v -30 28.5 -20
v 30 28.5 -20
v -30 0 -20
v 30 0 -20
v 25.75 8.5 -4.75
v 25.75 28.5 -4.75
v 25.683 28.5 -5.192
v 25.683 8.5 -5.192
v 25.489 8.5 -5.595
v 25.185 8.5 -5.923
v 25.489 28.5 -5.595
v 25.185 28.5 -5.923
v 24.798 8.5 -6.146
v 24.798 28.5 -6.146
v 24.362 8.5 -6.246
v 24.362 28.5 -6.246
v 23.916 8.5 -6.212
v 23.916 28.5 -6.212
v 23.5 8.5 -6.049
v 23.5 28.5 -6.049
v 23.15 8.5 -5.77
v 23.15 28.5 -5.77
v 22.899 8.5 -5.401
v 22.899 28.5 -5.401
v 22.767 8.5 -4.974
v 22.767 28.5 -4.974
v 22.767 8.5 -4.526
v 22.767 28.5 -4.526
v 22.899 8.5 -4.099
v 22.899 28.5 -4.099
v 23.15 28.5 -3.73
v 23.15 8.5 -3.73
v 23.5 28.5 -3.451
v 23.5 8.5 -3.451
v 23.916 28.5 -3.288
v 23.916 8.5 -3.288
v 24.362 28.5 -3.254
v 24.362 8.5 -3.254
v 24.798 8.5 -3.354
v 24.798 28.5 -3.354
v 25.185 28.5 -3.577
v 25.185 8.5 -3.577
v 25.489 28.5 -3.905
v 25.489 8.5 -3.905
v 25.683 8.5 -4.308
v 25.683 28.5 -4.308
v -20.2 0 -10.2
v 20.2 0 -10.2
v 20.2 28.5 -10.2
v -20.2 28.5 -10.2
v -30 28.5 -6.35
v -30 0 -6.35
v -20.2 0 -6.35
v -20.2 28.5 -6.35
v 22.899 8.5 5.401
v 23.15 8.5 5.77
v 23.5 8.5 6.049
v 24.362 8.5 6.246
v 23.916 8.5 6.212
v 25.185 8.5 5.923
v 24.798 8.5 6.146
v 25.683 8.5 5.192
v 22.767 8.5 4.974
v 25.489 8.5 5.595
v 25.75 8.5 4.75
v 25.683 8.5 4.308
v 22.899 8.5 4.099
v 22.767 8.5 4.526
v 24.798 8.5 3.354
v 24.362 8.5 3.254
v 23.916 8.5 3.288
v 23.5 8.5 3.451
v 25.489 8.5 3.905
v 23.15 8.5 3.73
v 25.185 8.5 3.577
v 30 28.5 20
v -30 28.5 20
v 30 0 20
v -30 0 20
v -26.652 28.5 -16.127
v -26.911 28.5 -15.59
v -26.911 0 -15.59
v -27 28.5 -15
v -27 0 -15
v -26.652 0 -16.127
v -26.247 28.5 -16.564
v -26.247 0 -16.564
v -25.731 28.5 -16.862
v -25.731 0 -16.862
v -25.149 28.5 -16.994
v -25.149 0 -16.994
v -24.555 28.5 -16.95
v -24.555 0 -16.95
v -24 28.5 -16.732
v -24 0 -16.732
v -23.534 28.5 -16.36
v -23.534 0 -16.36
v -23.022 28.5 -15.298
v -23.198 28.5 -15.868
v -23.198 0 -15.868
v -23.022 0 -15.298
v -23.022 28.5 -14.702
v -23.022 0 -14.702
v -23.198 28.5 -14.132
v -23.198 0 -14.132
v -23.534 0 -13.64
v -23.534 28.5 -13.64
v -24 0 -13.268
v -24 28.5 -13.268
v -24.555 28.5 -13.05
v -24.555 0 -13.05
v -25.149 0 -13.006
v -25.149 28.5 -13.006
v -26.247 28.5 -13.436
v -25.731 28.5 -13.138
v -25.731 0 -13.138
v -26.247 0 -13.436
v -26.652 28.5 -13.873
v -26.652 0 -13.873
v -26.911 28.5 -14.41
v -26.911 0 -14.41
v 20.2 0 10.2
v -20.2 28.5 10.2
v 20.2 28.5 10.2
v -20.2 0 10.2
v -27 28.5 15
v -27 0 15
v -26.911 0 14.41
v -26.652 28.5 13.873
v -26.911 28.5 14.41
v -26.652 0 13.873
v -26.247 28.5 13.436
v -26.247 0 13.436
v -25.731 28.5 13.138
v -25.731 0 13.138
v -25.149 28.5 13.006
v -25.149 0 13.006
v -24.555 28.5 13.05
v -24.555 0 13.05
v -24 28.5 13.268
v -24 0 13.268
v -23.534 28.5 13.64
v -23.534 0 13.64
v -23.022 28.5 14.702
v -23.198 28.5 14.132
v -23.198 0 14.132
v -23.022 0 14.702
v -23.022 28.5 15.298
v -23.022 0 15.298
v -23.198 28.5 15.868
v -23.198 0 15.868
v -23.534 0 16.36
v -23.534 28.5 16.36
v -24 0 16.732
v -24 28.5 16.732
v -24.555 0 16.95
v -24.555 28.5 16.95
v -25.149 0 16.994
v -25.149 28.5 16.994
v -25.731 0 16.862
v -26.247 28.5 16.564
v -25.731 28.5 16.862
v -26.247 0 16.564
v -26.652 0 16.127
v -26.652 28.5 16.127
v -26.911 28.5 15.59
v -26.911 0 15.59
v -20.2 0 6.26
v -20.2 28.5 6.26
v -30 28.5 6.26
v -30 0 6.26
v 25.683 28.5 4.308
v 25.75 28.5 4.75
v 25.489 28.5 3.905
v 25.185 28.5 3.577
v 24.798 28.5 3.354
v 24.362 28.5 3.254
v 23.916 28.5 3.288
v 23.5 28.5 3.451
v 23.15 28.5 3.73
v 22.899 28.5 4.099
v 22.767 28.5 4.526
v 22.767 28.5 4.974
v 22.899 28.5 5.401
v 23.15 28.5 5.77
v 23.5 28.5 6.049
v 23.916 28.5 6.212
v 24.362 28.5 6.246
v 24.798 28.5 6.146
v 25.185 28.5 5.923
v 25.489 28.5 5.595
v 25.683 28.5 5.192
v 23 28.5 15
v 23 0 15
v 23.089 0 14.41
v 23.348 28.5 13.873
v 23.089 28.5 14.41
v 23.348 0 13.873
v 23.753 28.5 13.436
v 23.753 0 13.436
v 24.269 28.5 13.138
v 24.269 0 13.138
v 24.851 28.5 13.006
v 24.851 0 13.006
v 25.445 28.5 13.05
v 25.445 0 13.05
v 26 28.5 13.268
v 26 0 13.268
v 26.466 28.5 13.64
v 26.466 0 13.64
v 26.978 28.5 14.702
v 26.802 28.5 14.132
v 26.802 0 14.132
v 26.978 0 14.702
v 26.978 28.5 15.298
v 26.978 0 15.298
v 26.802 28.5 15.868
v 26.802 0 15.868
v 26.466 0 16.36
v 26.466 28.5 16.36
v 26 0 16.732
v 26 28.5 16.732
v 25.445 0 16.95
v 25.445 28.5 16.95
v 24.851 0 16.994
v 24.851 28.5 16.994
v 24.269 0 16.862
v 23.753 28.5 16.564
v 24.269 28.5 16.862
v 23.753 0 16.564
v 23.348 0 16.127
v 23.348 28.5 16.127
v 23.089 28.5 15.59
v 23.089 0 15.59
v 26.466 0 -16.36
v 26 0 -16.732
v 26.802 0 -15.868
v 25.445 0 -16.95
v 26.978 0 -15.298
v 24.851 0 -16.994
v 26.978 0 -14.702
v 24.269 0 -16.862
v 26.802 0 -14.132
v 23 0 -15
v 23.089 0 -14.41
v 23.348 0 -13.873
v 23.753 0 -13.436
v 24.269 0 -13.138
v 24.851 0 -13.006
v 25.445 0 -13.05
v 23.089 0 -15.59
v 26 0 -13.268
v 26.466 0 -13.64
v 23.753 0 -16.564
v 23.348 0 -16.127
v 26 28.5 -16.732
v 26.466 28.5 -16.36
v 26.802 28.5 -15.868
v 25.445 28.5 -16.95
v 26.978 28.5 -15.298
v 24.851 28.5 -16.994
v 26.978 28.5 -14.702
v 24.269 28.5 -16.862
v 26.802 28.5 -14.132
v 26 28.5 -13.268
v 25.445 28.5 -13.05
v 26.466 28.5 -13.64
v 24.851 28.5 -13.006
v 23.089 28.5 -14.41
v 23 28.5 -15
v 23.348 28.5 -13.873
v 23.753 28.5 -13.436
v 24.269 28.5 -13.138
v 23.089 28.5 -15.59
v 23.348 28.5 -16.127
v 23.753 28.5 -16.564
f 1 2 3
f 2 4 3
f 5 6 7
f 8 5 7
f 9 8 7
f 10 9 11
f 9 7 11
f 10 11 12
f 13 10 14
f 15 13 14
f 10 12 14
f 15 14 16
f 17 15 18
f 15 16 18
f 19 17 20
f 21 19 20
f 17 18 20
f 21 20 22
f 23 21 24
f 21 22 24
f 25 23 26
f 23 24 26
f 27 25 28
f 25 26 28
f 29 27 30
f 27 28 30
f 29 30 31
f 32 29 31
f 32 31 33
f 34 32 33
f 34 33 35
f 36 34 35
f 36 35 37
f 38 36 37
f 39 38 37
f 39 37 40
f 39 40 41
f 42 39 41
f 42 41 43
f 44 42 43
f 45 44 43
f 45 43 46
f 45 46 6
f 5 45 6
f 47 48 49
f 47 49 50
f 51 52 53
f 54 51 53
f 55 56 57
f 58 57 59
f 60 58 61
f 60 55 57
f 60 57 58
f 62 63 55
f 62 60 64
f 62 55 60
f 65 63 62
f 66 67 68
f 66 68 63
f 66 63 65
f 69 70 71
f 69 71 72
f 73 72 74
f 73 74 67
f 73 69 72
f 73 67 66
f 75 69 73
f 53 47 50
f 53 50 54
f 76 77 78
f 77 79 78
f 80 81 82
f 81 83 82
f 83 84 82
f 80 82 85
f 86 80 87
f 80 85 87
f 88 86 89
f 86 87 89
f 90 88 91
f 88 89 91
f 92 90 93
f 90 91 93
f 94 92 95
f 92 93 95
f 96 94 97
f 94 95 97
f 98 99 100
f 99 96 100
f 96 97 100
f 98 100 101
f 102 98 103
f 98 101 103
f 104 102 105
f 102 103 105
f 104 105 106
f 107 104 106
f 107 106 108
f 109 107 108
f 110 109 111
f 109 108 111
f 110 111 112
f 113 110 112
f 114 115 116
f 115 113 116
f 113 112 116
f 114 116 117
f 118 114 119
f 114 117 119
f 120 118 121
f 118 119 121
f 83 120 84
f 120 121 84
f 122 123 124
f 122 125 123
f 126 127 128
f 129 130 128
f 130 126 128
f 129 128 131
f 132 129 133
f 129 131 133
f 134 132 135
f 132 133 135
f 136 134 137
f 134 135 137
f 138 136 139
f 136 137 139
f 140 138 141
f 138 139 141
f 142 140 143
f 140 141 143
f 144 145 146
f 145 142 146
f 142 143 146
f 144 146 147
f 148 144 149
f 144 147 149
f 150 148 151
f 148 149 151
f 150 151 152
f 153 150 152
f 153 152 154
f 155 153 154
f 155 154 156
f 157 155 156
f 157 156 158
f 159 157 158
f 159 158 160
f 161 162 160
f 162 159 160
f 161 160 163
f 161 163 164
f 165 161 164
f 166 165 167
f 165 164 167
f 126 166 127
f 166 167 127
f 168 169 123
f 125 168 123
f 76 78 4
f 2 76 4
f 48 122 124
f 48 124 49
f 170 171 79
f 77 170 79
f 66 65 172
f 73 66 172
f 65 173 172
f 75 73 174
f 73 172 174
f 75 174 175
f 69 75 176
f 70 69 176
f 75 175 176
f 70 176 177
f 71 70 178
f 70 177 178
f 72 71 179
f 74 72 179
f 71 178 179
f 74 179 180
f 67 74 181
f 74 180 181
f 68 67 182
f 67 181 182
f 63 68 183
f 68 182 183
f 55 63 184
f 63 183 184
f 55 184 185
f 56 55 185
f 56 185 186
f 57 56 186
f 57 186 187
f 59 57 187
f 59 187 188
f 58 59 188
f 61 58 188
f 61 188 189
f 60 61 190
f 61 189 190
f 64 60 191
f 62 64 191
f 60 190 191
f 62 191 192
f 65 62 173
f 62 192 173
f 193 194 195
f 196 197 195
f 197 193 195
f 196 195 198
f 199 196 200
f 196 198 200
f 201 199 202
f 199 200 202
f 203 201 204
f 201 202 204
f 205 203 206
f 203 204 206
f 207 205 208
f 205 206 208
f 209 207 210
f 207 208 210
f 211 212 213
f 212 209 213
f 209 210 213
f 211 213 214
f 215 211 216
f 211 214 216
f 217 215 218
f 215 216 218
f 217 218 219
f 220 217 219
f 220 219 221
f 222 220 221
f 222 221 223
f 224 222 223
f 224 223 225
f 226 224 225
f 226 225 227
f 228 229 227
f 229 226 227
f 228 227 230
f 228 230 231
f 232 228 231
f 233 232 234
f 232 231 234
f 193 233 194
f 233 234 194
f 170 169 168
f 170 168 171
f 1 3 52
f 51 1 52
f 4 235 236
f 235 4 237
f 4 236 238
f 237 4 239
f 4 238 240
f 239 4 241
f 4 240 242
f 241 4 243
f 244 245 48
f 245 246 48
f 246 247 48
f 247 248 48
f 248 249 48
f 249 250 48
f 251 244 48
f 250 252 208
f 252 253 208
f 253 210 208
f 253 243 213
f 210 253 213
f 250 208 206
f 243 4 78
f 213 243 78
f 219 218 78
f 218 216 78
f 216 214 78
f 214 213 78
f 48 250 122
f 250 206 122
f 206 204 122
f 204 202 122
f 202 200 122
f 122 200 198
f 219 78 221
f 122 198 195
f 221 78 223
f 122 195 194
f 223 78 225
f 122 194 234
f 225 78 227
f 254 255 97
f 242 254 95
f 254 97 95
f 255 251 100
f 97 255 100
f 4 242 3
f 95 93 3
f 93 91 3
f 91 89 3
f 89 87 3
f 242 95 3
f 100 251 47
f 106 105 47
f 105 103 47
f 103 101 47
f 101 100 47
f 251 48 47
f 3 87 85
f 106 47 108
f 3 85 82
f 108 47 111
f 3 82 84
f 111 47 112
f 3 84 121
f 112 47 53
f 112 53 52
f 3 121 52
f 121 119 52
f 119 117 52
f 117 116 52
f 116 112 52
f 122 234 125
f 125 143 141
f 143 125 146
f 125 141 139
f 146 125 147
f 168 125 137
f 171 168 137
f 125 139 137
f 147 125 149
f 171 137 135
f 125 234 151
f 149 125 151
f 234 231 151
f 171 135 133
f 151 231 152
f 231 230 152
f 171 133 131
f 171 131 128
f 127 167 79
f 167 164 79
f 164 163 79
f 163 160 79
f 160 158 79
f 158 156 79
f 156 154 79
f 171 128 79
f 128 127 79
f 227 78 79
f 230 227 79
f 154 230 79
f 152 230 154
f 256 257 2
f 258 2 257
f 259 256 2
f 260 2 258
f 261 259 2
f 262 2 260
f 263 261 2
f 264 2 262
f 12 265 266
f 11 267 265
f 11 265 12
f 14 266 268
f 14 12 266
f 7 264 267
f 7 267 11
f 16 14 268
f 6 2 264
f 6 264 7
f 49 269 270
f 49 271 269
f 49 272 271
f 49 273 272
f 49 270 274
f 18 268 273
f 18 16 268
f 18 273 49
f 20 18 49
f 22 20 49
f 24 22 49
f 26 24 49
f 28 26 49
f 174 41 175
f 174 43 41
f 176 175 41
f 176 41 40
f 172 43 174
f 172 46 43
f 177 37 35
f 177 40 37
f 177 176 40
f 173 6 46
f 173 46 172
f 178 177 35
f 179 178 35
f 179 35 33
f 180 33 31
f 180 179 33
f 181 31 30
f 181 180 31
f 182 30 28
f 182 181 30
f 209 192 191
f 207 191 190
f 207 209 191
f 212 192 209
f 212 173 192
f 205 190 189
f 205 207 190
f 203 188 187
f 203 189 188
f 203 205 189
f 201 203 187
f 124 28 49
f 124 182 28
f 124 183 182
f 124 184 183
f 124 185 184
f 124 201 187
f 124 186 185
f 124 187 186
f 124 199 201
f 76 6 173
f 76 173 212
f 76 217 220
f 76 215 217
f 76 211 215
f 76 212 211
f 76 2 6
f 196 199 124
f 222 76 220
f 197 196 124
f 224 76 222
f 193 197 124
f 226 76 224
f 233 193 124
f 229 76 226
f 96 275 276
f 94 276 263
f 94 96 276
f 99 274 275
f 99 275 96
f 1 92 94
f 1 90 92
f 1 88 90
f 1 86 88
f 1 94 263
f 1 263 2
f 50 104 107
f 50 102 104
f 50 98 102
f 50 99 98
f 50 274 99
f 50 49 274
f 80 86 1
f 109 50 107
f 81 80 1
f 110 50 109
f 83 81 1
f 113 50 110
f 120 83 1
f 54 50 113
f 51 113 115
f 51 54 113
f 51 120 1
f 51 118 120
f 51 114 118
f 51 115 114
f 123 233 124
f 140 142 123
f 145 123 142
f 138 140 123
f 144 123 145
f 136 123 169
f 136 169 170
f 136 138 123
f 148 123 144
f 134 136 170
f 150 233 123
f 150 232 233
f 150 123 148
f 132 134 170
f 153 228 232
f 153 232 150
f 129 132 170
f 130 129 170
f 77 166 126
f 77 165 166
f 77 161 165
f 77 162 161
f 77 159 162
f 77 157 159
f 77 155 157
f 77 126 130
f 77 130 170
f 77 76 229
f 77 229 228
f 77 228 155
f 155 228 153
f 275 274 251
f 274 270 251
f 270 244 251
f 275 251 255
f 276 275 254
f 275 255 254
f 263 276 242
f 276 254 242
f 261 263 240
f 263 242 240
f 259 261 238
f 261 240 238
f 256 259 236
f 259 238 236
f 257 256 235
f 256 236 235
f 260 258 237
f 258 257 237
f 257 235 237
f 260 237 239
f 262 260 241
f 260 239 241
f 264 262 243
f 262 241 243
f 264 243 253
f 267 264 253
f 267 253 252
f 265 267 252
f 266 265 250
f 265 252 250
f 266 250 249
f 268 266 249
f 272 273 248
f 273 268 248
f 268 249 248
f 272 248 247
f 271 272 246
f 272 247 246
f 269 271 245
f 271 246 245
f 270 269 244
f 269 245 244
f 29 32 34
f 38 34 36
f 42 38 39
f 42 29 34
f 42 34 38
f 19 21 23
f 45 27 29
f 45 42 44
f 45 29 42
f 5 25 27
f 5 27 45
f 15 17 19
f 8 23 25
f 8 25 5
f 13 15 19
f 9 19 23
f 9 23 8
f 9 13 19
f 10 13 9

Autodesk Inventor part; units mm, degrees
ref_plane "YZ Plane" through (0, 0, 0) normal (1, 0, 0) x (0, 1, 0)
ref_plane "XZ Plane" through (0, 0, 0) normal (0, 1, 0) x (-1, 0, 0)
ref_plane "XY Plane" through (0, 0, 0) normal (0, 0, 1) x (1, 0, 0)
sketch "Sketch1" plane through (0, 0, 0) normal (0, 1, 0) x (-1, 0, 0)
  line L0 (-20.2, -10.2) -> (20.2, -10.2)
  line L1 (20.2, -10.2) -> (20.2, 10.2)
  line L2 (20.2, 10.2) -> (-20.2, 10.2)
  line L3 (-20.2, 10.2) -> (-20.2, -10.2)
  line L4 (-20.2, -10.2) -> (20.2, 10.2) construction
  line L5 (20.2, -10.2) -> (-20.2, 10.2) construction
  line L6 (-30, -20) -> (30, -20)
  line L7 (30, -20) -> (30, 20)
  line L8 (30, 20) -> (-30, 20)
  line L9 (-30, 20) -> (-30, -20)
  line L10 (-30, -20) -> (30, 20) construction
  line L11 (30, -20) -> (-30, 20) construction
  circle A0 centre (25, 15) radius 2
  circle A1 centre (25, -15) radius 2
  circle A2 centre (-25, 15) radius 2
  circle A3 centre (-25, -15) radius 2
  point P0 (0, 0)
  dimension "d0" = 20.4
  dimension "d1" = 40.4
  dimension "d2" = 60
  dimension "d3" = 40
  dimension "d4" = 4
  dimension "d5" = 4
  dimension "d7" = 4
  dimension "d8" = 5
  dimension "d9" = 5
  dimension "d10" = 5
  dimension "d11" = 5
  dimension "d13" = 4
  dimension "d14" = 5
  dimension "d15" = 5
  dimension "d16" = 5
  dimension "d17" = 5
extrude "Extrusion1" add sketch "Sketch1" along normal blind 28.5
sketch "Sketch2" plane through (0, 28.5, 0) normal (0, 1, 0) x (1, 0, 0)
  circle A0 centre (-24.25, -4.75) radius 1.5
  circle A1 centre (-24.25, 4.75) radius 1.5
  circle A2 centre (24.25, -4.75) radius 1.5
  circle A3 centre (24.25, 4.75) radius 1.5
  line L0 (20.2, 10.2) -> (20.2, -10.2) projected
  point P0 (0, 0)
  point P1 (20.2, 0)
  dimension "d20" = 3
  dimension "d21" = 3
  dimension "d22" = 3
  dimension "d23" = 3
  dimension "d24" = 48.5
  dimension "d25" = 24.25
  dimension "d26" = 48.5
  dimension "d27" = 24.25
  dimension "d28" = 9.5
  dimension "d29" = 4.75
  dimension "d30" = 9.5
  dimension "d31" = 4.75
extrude "Extrusion2" cut sketch "Sketch2" against normal blind 20
sketch "Sketch3" plane through (0, 28.5, 0) normal (0, 1, 0) x (1, 0, 0)
  line L0 (-30, 20) -> (-30, -20) projected
  line L1 (-20.2, -10.2) -> (-20.2, 10.2) projected
  line L2 (-30, 6.3495) -> (-20.2, 6.3495)
  line L3 (-20.2, 6.3495) -> (-20.2, -6.2601)
  line L4 (-20.2, -6.2601) -> (-30, -6.2601)
  line L5 (-30, -6.2601) -> (-30, 6.3495)
  point P0 (0, 0)
  point P1 (-20.2, 6.3495)
extrude "Extrusion3" cut sketch "Sketch3" against normal through all
properties part number "Servoholder"
